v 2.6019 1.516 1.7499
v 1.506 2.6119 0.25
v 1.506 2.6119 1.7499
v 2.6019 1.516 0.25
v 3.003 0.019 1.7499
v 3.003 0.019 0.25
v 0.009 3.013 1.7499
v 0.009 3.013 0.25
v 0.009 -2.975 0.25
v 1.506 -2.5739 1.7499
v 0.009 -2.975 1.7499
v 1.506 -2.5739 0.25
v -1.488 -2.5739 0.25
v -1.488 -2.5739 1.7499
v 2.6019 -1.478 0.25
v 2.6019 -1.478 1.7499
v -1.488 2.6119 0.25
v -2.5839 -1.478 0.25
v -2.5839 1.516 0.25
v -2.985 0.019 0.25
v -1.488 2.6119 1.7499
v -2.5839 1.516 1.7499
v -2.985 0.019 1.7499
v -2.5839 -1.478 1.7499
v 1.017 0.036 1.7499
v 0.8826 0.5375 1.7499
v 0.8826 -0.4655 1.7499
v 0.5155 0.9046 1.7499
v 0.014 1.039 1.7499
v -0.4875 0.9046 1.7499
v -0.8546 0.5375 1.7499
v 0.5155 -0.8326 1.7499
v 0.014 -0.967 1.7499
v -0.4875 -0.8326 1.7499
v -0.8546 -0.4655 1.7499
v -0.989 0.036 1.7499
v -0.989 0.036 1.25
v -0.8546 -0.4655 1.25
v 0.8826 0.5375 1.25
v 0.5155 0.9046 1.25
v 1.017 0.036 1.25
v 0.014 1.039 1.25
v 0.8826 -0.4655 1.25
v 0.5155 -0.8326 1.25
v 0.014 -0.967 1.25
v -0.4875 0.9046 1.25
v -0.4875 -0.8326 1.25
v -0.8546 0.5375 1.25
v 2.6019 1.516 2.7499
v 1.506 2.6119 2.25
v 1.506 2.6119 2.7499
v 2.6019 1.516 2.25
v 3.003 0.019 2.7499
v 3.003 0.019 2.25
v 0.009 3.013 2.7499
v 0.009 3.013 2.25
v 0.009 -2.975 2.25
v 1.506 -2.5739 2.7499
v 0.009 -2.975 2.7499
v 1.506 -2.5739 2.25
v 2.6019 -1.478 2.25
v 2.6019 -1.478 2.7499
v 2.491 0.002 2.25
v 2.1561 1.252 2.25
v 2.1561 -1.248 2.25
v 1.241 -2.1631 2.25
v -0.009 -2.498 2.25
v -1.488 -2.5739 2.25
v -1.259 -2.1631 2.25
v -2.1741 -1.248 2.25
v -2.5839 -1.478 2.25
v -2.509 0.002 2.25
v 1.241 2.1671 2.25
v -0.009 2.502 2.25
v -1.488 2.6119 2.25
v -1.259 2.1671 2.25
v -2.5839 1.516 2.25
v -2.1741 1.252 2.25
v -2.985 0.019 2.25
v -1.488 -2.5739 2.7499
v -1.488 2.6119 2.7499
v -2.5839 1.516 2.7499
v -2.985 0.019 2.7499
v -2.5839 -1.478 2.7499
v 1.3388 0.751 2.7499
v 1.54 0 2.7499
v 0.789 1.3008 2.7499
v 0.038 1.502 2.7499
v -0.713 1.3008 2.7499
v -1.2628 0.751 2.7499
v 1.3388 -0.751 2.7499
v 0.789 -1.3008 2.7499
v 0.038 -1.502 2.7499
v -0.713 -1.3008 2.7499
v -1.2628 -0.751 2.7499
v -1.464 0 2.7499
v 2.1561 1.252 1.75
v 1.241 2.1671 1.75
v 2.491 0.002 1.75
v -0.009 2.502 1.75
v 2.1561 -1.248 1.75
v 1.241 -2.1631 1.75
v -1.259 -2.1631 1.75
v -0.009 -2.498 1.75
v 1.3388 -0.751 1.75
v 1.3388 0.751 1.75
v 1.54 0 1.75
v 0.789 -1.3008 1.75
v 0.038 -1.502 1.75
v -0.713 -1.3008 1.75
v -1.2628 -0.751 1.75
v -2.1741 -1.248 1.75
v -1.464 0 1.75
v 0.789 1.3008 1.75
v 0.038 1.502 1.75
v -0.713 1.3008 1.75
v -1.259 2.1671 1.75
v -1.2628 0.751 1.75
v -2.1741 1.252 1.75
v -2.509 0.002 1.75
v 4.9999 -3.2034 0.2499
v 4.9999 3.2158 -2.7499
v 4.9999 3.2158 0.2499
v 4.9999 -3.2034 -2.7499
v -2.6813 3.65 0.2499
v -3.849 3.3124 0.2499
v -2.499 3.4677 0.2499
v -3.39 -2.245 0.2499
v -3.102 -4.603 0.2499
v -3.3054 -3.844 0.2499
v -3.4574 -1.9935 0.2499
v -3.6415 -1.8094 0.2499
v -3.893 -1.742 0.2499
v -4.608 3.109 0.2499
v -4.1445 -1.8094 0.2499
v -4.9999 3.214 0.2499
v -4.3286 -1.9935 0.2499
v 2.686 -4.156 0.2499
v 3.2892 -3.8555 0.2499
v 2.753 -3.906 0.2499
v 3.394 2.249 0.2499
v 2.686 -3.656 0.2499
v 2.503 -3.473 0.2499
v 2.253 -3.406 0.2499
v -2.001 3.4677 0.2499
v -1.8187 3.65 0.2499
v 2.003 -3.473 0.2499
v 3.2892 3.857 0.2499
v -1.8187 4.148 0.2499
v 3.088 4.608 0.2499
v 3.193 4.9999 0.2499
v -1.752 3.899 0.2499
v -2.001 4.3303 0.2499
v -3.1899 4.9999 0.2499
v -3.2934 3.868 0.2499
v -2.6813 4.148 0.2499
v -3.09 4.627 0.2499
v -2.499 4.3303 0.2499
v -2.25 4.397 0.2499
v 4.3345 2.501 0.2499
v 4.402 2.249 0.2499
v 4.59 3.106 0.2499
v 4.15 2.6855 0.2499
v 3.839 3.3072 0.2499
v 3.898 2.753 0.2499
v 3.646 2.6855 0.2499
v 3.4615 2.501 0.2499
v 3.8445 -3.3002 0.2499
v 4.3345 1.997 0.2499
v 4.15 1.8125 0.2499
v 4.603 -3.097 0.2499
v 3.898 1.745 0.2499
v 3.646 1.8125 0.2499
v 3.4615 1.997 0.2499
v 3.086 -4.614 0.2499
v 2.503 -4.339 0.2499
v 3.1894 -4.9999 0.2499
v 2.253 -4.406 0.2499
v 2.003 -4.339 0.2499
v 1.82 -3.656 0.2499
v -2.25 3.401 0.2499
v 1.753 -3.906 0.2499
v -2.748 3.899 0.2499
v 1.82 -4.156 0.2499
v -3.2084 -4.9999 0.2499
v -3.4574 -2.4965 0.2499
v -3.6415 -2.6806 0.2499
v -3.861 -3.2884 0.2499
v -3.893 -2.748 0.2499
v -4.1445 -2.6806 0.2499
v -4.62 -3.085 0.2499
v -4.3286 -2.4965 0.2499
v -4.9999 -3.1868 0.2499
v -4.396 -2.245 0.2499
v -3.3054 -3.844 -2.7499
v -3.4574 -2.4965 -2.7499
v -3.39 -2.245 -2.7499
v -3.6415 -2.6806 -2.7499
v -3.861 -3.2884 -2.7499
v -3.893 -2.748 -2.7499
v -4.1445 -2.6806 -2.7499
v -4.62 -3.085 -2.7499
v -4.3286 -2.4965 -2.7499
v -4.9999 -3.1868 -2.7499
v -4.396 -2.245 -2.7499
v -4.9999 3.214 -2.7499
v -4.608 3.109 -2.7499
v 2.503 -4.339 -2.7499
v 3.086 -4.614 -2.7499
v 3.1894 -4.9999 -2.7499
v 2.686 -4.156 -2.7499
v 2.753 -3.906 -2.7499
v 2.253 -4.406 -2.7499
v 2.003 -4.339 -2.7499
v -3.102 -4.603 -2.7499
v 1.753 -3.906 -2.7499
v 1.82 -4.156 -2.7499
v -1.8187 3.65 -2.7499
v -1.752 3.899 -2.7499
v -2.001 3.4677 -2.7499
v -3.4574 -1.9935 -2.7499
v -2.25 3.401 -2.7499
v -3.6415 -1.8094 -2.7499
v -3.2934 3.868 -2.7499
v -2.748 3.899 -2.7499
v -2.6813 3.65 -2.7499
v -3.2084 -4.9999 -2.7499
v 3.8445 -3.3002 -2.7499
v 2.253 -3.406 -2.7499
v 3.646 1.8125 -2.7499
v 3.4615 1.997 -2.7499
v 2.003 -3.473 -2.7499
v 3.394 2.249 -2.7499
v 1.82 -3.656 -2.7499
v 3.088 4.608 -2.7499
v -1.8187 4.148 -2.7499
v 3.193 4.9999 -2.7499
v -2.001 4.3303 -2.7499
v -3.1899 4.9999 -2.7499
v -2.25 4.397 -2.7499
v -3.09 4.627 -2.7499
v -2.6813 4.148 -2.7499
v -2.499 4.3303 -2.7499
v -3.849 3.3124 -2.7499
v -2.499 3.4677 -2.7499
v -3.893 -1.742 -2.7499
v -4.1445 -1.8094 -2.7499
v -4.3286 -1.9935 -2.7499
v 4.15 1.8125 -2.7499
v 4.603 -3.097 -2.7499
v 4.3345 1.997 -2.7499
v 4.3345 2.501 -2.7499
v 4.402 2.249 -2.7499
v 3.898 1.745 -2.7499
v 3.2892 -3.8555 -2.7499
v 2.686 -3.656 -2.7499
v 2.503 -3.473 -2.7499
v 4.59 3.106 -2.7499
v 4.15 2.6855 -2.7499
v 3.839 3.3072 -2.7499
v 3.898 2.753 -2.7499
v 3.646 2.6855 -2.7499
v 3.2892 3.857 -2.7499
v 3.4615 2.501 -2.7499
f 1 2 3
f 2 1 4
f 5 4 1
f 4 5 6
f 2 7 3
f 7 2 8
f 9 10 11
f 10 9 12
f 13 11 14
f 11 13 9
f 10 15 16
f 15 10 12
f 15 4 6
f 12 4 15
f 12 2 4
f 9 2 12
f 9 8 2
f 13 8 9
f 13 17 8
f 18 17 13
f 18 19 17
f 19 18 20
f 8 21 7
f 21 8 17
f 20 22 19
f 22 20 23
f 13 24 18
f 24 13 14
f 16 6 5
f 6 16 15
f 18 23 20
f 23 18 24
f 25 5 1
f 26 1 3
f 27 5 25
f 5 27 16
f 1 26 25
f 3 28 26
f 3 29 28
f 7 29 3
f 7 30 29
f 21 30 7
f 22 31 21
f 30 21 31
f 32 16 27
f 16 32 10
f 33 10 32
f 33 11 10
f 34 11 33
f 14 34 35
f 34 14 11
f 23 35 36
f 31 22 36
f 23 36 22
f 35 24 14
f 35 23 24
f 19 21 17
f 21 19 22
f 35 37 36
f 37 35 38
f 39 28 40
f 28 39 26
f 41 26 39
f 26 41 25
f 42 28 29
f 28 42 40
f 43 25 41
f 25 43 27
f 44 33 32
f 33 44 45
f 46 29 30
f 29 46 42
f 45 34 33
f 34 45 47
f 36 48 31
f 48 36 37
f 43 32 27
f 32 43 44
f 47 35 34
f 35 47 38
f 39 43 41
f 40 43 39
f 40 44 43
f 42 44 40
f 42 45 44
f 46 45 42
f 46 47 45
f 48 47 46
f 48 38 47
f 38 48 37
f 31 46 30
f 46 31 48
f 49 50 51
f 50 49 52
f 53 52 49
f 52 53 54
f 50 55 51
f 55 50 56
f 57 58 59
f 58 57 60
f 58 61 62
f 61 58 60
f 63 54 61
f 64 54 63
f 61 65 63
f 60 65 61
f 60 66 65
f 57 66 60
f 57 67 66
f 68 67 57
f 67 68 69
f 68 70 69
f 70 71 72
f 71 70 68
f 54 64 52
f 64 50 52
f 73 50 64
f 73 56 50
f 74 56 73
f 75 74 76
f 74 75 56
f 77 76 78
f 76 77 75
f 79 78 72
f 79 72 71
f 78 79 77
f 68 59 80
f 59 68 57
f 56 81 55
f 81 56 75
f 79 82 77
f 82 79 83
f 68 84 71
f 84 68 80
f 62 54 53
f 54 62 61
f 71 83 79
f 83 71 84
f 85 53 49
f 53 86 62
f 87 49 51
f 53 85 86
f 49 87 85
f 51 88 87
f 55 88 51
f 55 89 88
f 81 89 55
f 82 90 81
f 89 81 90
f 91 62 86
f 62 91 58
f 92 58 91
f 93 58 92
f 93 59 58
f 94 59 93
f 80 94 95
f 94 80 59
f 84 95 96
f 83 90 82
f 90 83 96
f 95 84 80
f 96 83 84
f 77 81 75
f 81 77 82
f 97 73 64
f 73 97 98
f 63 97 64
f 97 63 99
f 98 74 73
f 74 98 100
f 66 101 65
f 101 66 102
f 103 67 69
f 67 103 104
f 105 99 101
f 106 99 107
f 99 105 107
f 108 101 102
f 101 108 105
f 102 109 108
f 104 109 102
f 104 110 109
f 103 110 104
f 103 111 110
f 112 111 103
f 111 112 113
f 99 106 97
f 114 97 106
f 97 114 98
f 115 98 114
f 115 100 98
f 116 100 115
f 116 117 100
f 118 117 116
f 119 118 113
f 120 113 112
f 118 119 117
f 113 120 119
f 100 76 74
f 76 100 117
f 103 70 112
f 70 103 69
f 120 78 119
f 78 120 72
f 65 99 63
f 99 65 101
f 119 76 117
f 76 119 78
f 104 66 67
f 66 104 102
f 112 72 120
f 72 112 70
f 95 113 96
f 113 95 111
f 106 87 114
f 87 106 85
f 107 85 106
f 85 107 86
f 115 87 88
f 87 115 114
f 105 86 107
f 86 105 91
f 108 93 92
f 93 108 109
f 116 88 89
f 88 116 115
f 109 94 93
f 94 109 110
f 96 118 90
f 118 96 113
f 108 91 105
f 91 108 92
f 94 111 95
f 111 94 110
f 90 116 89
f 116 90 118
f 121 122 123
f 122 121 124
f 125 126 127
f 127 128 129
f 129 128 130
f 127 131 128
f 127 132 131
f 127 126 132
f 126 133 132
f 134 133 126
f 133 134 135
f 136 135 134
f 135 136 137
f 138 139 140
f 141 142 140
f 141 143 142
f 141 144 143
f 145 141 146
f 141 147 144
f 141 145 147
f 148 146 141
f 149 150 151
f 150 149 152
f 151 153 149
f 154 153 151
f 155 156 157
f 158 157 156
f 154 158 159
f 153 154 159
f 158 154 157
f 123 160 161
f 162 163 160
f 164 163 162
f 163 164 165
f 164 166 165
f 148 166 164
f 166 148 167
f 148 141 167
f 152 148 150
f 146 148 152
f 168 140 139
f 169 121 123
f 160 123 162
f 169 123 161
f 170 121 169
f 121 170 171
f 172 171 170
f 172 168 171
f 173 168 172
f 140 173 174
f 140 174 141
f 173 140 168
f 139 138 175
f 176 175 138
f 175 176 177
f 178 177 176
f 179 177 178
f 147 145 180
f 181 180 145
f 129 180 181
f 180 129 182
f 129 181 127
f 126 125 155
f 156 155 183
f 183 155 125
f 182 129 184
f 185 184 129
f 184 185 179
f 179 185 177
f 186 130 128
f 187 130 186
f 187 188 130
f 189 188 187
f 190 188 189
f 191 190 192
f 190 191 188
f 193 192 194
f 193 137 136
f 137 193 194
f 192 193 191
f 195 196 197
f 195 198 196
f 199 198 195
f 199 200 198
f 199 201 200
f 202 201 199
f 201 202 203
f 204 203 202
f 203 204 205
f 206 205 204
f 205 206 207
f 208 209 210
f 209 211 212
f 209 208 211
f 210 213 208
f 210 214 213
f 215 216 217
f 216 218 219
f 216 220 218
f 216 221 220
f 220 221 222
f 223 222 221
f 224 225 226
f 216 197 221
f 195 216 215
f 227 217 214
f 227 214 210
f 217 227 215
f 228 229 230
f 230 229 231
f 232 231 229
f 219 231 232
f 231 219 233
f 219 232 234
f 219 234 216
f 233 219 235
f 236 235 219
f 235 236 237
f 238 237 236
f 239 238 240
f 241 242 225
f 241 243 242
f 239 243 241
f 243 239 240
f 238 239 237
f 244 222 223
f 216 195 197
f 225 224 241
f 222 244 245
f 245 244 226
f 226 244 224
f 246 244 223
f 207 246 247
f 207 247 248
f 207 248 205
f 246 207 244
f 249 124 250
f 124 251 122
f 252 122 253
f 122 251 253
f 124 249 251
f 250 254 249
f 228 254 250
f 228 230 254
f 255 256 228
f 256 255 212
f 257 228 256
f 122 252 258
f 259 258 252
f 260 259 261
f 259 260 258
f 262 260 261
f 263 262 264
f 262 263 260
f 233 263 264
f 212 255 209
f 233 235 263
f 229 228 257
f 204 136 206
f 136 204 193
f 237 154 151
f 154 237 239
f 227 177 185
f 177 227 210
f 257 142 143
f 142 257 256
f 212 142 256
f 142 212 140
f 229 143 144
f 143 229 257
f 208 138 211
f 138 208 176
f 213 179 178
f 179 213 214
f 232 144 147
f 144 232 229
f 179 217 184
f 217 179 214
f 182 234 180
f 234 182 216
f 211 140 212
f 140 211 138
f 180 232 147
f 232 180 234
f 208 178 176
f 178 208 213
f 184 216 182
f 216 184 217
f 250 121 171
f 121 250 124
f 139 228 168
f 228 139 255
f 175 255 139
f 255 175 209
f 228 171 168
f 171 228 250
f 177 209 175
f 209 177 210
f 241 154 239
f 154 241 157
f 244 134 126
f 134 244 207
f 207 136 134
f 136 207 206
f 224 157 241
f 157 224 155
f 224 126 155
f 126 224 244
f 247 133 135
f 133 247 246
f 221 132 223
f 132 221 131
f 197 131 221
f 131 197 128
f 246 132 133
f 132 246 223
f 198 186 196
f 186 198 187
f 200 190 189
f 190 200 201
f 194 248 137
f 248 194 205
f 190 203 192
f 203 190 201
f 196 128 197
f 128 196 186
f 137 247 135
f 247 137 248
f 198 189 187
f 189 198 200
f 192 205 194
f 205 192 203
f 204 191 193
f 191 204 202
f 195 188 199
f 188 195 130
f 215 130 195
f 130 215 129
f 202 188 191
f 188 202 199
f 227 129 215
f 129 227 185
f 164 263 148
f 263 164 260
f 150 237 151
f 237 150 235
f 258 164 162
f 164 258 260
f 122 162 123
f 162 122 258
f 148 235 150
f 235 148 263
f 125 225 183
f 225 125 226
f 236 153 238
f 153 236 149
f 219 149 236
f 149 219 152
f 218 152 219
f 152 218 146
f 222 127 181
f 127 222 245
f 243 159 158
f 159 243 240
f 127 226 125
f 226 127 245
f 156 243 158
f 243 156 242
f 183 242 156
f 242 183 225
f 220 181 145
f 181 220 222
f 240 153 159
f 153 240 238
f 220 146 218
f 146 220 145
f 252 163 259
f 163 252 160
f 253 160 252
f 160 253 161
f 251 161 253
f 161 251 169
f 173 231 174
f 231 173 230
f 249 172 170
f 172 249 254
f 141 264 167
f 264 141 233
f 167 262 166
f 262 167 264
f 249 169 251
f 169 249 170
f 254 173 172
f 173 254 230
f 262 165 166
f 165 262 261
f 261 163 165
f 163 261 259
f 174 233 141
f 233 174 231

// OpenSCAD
intersection() {
  cube(size = [11.9999, 11.9999, 6.5999], center = true);

  union() {
    difference() {
      translate([0.009, 0.019, 1])
      cylinder(h = 1.4999, r1 = 2.994, r2 = 2.994, center = true, $fn = 12);
    
      translate([0.014, 0.036, 1.75])
      cylinder(h = 1, r1 = 1.003, r2 = 1.003, center = true, $fn = 12);
    }
  
    difference() {
      union() {
        translate([0.009, 0.019, 2.5])
        cylinder(h = 0.4999, r1 = 2.994, r2 = 2.994, center = true, $fn = 12);
      
        translate([-0.009, 0.002, 2.25])
        cylinder(h = 0.9999, r1 = 2.5, r2 = 2.5, center = true, $fn = 12);
      }
    
      translate([0.038, 0, 10.375])
      cylinder(h = 17.25, r1 = 1.502, r2 = 1.502, center = true, $fn = 12);
    }
  
    difference() {
      difference() {
        difference() {
          difference() {
            translate([0, 0, -1.25])
            cube(size = [9.9999, 9.9999, 2.9999], center = true);
          
            translate([2.253, -3.906, 8.125])
            cylinder(h = 21.75, r1 = 0.5, r2 = 0.5, center = true, $fn = 12);
          }
        
          union() {
            translate([4.603, -4.614, 8.125])
            cylinder(h = 21.75, r1 = 1.517, r2 = 1.517, center = true, $fn = 12);
          
            translate([-4.608, 4.627, -1.25])
            cylinder(h = 3, r1 = 1.518, r2 = 1.518, center = true, $fn = 12);
          }
        }
      
        translate([-3.893, -2.245, 8.125])
        cylinder(h = 21.75, r1 = 0.503, r2 = 0.503, center = true, $fn = 12);
      }
    
      union() {
        translate([-4.62, -4.603, -9.375])
        cylinder(h = 19.25, r1 = 1.518, r2 = 1.518, center = true, $fn = 12);
      
        translate([4.59, 4.608, 8.125])
        cylinder(h = 21.75, r1 = 1.502, r2 = 1.502, center = true, $fn = 12);
      
        translate([-2.25, 3.899, -9.375])
        cylinder(h = 19.25, r1 = 0.498, r2 = 0.498, center = true, $fn = 12);
      
        translate([3.898, 2.249, -9.375])
        cylinder(h = 19.25, r1 = 0.504, r2 = 0.504, center = true, $fn = 12);
      }
    }
  }
}
